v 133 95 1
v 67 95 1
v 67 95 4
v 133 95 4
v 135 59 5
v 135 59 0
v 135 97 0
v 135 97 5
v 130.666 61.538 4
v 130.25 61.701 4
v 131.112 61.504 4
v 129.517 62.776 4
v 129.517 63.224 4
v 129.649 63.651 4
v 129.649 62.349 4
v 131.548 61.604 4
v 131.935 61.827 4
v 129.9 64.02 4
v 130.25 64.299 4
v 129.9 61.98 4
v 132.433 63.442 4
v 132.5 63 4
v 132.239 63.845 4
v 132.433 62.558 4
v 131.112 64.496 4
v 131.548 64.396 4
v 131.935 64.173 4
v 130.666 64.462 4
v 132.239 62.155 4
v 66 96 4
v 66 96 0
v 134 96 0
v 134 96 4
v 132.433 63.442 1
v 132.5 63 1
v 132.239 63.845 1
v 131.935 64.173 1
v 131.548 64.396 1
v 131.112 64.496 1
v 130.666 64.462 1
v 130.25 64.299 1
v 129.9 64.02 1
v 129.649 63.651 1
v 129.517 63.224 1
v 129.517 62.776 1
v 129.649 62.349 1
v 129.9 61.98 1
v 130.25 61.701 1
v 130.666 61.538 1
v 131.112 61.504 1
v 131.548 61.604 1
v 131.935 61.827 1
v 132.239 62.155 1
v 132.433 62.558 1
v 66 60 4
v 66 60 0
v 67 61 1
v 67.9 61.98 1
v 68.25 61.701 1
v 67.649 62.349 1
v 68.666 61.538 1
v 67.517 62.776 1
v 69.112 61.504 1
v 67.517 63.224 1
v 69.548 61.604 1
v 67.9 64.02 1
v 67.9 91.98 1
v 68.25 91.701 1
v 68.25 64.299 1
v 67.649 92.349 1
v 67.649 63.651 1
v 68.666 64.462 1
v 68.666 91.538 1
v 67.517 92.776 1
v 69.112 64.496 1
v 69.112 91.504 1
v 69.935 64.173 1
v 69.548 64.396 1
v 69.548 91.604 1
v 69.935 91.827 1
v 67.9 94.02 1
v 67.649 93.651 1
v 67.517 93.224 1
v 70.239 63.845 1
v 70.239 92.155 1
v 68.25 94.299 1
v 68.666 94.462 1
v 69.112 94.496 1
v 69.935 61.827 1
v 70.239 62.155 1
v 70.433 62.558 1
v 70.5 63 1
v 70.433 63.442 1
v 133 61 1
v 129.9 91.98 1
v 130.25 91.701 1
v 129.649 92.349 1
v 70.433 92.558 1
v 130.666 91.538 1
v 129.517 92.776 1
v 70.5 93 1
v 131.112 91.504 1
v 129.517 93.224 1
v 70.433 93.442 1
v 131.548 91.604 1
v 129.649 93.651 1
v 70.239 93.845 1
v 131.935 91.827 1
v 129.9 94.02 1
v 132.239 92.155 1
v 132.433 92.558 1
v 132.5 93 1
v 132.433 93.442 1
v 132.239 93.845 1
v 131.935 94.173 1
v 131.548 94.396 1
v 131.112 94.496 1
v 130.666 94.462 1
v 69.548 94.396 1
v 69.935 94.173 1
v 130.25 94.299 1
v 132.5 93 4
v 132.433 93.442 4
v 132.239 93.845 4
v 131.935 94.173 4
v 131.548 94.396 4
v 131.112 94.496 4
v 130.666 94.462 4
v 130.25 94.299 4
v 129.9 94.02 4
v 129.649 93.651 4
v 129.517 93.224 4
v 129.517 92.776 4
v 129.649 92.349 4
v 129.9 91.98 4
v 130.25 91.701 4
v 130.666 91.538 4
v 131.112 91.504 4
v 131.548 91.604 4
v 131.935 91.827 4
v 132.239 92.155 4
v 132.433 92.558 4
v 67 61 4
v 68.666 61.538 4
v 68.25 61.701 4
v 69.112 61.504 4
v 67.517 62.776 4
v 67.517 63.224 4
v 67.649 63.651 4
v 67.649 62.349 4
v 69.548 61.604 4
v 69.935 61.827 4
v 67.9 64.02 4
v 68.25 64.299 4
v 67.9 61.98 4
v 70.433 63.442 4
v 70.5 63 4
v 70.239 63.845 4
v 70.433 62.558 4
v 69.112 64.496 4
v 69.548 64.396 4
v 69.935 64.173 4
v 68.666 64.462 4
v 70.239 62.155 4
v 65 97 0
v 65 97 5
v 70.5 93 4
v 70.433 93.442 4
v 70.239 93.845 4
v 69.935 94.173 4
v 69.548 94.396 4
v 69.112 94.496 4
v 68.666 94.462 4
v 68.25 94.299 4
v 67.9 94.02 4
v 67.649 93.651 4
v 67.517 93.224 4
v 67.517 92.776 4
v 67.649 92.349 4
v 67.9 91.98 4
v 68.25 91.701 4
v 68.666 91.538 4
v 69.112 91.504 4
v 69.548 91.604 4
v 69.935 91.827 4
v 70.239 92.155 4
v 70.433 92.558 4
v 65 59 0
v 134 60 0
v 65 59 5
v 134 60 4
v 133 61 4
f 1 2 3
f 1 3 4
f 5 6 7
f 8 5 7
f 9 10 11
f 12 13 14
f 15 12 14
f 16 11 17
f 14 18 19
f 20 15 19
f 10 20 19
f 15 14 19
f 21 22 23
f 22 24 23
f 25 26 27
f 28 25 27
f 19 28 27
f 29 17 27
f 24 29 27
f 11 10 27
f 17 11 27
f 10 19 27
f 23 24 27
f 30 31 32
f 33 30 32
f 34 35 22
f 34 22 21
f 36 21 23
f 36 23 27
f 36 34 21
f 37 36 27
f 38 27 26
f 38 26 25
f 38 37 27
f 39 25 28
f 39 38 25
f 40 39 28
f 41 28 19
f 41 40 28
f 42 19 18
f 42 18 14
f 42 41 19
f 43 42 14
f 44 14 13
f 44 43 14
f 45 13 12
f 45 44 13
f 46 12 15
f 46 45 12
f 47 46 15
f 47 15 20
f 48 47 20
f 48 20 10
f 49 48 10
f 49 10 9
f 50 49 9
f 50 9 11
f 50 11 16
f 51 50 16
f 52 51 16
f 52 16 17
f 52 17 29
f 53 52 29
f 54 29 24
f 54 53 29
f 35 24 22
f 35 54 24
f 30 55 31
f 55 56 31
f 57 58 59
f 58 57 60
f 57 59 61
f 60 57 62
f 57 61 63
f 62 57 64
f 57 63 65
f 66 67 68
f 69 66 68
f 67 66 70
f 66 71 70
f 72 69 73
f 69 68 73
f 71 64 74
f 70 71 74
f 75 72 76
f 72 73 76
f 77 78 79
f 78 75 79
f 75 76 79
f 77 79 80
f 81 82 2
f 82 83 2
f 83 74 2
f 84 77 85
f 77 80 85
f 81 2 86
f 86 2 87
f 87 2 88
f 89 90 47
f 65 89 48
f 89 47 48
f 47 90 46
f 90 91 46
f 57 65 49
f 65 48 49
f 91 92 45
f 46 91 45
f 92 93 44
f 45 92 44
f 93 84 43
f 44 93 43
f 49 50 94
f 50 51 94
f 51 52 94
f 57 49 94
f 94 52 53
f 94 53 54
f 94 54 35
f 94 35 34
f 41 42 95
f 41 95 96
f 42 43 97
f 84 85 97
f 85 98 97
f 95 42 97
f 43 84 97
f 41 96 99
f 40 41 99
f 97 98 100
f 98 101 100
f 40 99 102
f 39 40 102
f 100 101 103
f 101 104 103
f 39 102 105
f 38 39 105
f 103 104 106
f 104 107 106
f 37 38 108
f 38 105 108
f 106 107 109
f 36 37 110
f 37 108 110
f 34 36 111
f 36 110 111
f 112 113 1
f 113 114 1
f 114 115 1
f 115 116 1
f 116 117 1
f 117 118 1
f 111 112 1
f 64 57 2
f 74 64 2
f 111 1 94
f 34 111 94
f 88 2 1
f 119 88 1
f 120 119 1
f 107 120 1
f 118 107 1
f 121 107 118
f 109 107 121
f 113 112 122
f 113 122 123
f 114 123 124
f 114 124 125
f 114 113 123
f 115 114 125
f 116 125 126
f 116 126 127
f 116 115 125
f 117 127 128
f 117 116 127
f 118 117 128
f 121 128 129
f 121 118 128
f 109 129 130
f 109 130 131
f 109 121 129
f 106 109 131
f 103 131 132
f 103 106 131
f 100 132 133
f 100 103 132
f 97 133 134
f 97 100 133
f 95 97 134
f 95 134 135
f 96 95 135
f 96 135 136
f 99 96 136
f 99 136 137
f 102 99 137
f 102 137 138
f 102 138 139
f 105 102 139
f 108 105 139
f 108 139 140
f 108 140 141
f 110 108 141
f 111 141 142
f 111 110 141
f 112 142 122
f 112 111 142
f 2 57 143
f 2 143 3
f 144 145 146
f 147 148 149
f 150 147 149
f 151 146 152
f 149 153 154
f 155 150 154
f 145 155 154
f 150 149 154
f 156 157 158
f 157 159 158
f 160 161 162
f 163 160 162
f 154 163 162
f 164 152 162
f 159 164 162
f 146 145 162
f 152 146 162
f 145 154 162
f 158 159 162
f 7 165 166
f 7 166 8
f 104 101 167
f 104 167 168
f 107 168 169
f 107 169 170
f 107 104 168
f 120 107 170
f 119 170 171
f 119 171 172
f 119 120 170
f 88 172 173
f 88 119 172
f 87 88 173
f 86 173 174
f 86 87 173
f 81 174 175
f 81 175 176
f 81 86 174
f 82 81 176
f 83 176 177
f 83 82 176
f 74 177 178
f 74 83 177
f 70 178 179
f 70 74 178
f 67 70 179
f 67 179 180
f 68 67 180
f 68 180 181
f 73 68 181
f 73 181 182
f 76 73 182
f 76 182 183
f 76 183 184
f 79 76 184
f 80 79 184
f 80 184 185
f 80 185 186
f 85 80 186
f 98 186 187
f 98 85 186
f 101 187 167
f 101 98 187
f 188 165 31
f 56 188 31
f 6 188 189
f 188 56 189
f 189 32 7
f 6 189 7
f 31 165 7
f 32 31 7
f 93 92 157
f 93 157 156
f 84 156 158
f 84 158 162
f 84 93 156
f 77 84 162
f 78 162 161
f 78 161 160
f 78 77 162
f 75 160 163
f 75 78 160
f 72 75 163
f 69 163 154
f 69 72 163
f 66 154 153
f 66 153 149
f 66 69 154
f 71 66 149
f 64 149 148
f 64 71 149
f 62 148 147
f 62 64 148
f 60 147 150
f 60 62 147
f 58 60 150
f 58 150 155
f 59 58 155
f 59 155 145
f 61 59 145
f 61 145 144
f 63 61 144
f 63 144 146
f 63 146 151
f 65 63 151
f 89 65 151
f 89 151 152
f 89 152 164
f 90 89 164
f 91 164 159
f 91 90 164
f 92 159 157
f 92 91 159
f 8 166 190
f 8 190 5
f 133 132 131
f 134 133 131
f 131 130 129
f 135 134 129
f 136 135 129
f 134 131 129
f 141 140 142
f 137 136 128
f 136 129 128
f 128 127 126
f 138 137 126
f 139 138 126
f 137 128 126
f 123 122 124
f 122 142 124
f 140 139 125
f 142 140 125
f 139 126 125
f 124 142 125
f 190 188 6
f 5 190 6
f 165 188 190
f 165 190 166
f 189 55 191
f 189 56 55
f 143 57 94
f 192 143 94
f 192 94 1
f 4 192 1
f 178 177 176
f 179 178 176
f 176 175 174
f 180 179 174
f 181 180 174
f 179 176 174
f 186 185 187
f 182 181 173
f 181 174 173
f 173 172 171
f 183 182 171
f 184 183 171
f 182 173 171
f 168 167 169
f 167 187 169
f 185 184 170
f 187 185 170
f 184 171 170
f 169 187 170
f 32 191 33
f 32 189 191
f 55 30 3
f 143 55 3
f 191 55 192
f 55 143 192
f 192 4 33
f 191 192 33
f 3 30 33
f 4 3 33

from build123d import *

# Parameters (mm, degrees)
SKETCH033_W   = 68
SKETCH033_H   = 36
PAD021_DEPTH  = 1
SKETCH034_W   = 68
SKETCH034_H   = 36
SKETCH034_W_2 = 66
SKETCH034_H_2 = 34
PAD022_DEPTH  = 3
SKETCH036_R   = 1.5
PAD024_DEPTH  = 3
BOX001_W      = 70
BOX001_H      = 38
BOX001_DEPTH  = 5


with BuildPart() as bottommold:
    # Sketch033 → Pad021 (new body)
    with BuildSketch(Plane.XY):
        Rectangle(SKETCH033_W, SKETCH033_H)
    extrude(amount=PAD021_DEPTH)

    # Sketch034 (on Face6 of Pad021) → Pad022 (join)
    with BuildSketch(Plane.XY.offset(1)):
        Rectangle(SKETCH034_W, SKETCH034_H)
        Rectangle(SKETCH034_W_2, SKETCH034_H_2, mode=Mode.SUBTRACT)
    extrude(amount=PAD022_DEPTH)

    # Sketch036 → Pad024 (join)
    with BuildSketch(Plane.XY.offset(1)):
        with Locations((-31, 15)):
            Circle(SKETCH036_R)
        with Locations((31, 15)):
            Circle(SKETCH036_R)
        with Locations((-31, -15)):
            Circle(SKETCH036_R)
        with Locations((31, -15)):
            Circle(SKETCH036_R)
    extrude(amount=PAD024_DEPTH)


with BuildPart() as bottommold_1:
    # Body007 placement: moved
    add(bottommold.part.moved(Location((100, 78, 0))))


with BuildPart() as bottom_mold:
    # Box001 → Box001 (new body)
    with BuildSketch(Plane(origin=(65, 59, 0), x_dir=(1, 0, 0), z_dir=(0, 0, 1))):
        with Locations((35, 19)):
            Rectangle(BOX001_W, BOX001_H)
    extrude(amount=BOX001_DEPTH)

    # Cut001: cut BottomMold
    add(bottommold_1.part, mode=Mode.SUBTRACT)


solid = bottom_mold.part
